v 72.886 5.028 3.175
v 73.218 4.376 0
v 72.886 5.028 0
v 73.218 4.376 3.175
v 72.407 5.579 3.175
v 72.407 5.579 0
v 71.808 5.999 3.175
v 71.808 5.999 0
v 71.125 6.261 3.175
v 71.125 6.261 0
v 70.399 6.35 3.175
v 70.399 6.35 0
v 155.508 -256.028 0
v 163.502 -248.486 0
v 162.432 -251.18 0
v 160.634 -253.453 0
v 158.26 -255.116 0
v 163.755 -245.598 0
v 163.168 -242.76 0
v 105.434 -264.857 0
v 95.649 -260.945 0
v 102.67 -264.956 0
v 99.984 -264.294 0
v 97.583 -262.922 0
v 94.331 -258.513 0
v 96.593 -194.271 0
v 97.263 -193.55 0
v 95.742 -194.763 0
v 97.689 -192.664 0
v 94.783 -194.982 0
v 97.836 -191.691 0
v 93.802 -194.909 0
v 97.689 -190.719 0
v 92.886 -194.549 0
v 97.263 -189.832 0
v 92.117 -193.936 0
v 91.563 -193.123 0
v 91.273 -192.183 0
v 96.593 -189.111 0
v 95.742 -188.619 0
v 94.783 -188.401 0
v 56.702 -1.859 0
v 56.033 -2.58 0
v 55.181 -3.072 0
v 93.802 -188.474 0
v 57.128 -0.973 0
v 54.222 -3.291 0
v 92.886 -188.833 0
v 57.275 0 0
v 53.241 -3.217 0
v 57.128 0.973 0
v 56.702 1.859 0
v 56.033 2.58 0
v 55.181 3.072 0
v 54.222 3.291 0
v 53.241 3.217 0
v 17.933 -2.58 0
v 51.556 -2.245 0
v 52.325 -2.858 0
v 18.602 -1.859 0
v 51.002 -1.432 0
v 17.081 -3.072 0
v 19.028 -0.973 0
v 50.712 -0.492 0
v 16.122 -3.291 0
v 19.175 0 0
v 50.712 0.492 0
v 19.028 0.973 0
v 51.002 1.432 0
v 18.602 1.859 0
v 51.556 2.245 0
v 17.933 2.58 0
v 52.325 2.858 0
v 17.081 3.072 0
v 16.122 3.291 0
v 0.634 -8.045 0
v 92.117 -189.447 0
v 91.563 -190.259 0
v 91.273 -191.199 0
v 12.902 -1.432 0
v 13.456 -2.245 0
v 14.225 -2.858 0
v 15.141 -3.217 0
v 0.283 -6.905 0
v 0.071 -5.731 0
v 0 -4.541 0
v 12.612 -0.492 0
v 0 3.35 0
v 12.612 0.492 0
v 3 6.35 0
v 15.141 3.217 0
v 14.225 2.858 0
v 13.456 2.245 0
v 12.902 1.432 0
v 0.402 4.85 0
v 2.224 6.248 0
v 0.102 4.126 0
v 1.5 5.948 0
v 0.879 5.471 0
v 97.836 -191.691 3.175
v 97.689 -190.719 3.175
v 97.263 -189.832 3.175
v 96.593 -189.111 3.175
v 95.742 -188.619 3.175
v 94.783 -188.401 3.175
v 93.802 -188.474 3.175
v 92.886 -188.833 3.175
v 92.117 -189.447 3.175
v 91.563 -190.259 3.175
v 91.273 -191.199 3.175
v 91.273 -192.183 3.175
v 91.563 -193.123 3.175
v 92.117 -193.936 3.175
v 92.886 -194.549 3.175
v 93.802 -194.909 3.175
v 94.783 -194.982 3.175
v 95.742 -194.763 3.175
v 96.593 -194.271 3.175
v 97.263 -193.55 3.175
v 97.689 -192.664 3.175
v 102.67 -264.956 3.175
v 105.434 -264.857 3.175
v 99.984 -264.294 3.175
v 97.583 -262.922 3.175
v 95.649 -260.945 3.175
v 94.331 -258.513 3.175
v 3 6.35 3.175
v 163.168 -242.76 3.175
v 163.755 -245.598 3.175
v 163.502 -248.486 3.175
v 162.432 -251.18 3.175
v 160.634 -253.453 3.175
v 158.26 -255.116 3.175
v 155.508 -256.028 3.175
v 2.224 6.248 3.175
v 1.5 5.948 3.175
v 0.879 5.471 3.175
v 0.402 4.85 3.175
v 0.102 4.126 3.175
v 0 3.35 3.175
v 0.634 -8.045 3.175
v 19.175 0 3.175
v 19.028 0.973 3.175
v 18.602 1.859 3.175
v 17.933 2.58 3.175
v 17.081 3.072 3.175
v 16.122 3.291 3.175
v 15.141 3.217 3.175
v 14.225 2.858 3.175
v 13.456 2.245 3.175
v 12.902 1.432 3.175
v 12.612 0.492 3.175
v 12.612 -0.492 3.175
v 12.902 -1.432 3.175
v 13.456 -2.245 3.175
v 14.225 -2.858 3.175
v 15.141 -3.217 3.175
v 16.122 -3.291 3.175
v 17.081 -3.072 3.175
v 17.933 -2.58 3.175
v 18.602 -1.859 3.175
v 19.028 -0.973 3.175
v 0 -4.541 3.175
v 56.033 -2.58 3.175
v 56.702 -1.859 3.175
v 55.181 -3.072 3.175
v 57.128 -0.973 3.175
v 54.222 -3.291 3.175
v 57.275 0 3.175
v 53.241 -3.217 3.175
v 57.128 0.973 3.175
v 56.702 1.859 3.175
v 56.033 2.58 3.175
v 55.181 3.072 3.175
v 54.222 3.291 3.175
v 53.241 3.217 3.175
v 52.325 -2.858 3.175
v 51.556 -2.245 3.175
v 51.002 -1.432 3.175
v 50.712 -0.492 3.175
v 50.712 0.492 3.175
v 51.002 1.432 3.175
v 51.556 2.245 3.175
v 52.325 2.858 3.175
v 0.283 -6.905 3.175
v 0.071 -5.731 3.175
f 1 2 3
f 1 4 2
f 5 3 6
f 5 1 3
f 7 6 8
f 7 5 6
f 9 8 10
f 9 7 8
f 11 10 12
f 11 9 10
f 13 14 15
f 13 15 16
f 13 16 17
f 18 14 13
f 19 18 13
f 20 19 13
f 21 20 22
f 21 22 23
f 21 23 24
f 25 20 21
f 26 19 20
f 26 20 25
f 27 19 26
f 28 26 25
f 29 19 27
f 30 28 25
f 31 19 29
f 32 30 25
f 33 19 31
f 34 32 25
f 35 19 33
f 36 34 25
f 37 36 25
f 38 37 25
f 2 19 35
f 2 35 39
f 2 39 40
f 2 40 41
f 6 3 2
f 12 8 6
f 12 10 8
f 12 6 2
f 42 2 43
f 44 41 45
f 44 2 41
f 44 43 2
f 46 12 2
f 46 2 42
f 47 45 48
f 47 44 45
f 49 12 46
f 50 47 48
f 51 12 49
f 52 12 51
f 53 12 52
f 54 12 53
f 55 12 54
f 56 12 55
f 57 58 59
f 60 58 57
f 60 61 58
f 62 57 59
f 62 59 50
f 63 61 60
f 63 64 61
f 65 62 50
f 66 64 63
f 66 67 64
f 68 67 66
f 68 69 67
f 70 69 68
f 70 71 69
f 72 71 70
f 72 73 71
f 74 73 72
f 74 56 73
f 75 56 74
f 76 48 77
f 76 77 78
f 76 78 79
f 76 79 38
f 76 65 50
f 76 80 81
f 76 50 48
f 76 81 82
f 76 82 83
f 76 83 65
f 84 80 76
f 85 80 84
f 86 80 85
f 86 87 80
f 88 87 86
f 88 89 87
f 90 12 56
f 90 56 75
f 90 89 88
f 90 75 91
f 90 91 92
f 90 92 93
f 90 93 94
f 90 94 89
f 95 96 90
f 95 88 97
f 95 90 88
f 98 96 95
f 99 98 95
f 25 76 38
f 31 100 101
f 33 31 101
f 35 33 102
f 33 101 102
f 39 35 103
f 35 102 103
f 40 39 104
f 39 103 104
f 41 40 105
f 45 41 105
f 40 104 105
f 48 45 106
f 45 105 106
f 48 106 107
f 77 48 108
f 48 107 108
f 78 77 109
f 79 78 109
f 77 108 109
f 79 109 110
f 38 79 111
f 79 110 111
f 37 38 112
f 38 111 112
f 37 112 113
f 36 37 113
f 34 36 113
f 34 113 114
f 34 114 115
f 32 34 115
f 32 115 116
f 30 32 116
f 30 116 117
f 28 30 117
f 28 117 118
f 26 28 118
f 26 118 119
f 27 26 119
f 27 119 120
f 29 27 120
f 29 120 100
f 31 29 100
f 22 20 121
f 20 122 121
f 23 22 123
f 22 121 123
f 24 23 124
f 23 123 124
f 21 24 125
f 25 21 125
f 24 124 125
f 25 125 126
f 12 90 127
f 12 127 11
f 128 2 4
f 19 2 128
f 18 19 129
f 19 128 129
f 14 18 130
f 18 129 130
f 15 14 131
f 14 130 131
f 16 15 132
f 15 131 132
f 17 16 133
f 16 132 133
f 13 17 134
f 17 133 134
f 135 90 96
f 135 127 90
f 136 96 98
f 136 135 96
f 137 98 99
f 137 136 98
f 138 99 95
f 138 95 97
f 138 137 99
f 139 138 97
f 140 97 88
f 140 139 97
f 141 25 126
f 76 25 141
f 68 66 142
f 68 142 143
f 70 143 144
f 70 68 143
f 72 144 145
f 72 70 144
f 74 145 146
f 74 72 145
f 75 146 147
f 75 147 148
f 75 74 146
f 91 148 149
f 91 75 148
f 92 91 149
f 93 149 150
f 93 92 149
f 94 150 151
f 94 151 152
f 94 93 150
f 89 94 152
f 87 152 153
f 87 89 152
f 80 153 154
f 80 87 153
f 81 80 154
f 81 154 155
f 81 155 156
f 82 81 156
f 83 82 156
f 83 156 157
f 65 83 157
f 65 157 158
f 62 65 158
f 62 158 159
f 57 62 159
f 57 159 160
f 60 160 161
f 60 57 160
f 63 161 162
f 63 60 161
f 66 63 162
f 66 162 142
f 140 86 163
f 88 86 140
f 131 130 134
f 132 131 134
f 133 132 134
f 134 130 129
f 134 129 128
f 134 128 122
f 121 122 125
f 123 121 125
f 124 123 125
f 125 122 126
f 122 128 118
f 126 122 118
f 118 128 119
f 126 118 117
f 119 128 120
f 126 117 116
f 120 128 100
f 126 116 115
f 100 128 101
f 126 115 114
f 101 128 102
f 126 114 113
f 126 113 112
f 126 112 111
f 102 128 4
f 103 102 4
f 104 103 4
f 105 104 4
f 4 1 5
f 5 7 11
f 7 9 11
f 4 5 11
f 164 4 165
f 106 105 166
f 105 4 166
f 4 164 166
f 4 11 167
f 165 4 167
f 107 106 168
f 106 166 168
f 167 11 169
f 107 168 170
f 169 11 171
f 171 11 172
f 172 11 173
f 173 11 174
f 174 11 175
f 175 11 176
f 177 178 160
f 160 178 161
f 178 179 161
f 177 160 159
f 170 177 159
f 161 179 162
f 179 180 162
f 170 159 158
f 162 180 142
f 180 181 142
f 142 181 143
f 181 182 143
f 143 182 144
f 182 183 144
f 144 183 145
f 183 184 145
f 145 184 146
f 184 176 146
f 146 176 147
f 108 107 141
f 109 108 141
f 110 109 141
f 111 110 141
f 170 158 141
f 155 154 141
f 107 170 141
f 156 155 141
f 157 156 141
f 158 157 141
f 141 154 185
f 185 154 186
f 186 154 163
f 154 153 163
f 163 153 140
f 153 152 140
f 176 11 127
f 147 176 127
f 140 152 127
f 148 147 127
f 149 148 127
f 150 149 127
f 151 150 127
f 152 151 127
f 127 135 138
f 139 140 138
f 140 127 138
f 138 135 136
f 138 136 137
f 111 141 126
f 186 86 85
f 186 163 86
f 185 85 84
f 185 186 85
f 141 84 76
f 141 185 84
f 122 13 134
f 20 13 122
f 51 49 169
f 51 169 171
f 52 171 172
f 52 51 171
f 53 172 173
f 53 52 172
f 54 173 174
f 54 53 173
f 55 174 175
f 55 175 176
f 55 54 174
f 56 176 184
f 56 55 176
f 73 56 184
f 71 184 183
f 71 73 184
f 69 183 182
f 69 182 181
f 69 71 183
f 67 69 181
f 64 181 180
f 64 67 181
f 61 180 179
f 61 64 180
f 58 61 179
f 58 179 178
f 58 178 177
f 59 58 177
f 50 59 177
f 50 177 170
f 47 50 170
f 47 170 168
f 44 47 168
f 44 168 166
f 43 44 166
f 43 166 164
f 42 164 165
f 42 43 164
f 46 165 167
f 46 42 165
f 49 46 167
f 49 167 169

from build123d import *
from OCP.BRepFilletAPI import BRepFilletAPI_MakeFillet

# Parameters (mm, degrees)
SKETCH1_R           = 3.3
BOSS_EXTRUDE1_DEPTH = 3.175
FILLET1_R1          = 10
FILLET1_R2          = 3
SKETCH2_R           = 3.3
CUT_EXTRUDE1_DEPTH  = 312.546271304


with BuildPart() as part:
    # Sketch1 → Boss-Extrude1 (new body)
    with BuildSketch(Plane.XY):
        Polygon((72.5, 6.35), (167.244494596, -253.95835952), (97.244494596, -266.301248169), (0, -6.35), (0, 6.35), align=None)
        with Locations((53.975, 0)):
            Circle(SKETCH1_R, mode=Mode.SUBTRACT)
        with Locations((15.875, 0)):
            Circle(SKETCH1_R, mode=Mode.SUBTRACT)
    extrude(amount=BOSS_EXTRUDE1_DEPTH)

    # Fillet1: one fillet with a radius per group of edges: ONE call of the kernel's fillet builder (fillet() takes one radius for all edges)
    fillet1_edges_1 = [part.edges().sort_by_distance(p)[0] for p in [
        (167.244494596, -253.95835952, 1.5875),
        (97.244494596, -266.301248169, 1.5875),
        (0, -6.35, 1.5875),
    ]]
    fillet1_edges_2 = [part.edges().sort_by_distance(p)[0] for p in [
        (72.5, 6.35, 1.5875),
        (0, 6.35, 1.5875),
    ]]
    fillet1 = BRepFilletAPI_MakeFillet(part.part.solid().wrapped)
    for e in fillet1_edges_1:
        fillet1.Add(FILLET1_R1, e.wrapped)
    for e in fillet1_edges_2:
        fillet1.Add(FILLET1_R2, e.wrapped)
    add(Compound.cast(fillet1.Shape()), mode=Mode.REPLACE)

    # Sketch2 → Cut-Extrude1 (cut, through all)
    with BuildSketch(Plane.XY.offset(3.175)):
        with Locations((94.53593378, -191.691292203)):
            Circle(SKETCH2_R)
    extrude(amount=-CUT_EXTRUDE1_DEPTH, mode=Mode.SUBTRACT)


solid = part.part
